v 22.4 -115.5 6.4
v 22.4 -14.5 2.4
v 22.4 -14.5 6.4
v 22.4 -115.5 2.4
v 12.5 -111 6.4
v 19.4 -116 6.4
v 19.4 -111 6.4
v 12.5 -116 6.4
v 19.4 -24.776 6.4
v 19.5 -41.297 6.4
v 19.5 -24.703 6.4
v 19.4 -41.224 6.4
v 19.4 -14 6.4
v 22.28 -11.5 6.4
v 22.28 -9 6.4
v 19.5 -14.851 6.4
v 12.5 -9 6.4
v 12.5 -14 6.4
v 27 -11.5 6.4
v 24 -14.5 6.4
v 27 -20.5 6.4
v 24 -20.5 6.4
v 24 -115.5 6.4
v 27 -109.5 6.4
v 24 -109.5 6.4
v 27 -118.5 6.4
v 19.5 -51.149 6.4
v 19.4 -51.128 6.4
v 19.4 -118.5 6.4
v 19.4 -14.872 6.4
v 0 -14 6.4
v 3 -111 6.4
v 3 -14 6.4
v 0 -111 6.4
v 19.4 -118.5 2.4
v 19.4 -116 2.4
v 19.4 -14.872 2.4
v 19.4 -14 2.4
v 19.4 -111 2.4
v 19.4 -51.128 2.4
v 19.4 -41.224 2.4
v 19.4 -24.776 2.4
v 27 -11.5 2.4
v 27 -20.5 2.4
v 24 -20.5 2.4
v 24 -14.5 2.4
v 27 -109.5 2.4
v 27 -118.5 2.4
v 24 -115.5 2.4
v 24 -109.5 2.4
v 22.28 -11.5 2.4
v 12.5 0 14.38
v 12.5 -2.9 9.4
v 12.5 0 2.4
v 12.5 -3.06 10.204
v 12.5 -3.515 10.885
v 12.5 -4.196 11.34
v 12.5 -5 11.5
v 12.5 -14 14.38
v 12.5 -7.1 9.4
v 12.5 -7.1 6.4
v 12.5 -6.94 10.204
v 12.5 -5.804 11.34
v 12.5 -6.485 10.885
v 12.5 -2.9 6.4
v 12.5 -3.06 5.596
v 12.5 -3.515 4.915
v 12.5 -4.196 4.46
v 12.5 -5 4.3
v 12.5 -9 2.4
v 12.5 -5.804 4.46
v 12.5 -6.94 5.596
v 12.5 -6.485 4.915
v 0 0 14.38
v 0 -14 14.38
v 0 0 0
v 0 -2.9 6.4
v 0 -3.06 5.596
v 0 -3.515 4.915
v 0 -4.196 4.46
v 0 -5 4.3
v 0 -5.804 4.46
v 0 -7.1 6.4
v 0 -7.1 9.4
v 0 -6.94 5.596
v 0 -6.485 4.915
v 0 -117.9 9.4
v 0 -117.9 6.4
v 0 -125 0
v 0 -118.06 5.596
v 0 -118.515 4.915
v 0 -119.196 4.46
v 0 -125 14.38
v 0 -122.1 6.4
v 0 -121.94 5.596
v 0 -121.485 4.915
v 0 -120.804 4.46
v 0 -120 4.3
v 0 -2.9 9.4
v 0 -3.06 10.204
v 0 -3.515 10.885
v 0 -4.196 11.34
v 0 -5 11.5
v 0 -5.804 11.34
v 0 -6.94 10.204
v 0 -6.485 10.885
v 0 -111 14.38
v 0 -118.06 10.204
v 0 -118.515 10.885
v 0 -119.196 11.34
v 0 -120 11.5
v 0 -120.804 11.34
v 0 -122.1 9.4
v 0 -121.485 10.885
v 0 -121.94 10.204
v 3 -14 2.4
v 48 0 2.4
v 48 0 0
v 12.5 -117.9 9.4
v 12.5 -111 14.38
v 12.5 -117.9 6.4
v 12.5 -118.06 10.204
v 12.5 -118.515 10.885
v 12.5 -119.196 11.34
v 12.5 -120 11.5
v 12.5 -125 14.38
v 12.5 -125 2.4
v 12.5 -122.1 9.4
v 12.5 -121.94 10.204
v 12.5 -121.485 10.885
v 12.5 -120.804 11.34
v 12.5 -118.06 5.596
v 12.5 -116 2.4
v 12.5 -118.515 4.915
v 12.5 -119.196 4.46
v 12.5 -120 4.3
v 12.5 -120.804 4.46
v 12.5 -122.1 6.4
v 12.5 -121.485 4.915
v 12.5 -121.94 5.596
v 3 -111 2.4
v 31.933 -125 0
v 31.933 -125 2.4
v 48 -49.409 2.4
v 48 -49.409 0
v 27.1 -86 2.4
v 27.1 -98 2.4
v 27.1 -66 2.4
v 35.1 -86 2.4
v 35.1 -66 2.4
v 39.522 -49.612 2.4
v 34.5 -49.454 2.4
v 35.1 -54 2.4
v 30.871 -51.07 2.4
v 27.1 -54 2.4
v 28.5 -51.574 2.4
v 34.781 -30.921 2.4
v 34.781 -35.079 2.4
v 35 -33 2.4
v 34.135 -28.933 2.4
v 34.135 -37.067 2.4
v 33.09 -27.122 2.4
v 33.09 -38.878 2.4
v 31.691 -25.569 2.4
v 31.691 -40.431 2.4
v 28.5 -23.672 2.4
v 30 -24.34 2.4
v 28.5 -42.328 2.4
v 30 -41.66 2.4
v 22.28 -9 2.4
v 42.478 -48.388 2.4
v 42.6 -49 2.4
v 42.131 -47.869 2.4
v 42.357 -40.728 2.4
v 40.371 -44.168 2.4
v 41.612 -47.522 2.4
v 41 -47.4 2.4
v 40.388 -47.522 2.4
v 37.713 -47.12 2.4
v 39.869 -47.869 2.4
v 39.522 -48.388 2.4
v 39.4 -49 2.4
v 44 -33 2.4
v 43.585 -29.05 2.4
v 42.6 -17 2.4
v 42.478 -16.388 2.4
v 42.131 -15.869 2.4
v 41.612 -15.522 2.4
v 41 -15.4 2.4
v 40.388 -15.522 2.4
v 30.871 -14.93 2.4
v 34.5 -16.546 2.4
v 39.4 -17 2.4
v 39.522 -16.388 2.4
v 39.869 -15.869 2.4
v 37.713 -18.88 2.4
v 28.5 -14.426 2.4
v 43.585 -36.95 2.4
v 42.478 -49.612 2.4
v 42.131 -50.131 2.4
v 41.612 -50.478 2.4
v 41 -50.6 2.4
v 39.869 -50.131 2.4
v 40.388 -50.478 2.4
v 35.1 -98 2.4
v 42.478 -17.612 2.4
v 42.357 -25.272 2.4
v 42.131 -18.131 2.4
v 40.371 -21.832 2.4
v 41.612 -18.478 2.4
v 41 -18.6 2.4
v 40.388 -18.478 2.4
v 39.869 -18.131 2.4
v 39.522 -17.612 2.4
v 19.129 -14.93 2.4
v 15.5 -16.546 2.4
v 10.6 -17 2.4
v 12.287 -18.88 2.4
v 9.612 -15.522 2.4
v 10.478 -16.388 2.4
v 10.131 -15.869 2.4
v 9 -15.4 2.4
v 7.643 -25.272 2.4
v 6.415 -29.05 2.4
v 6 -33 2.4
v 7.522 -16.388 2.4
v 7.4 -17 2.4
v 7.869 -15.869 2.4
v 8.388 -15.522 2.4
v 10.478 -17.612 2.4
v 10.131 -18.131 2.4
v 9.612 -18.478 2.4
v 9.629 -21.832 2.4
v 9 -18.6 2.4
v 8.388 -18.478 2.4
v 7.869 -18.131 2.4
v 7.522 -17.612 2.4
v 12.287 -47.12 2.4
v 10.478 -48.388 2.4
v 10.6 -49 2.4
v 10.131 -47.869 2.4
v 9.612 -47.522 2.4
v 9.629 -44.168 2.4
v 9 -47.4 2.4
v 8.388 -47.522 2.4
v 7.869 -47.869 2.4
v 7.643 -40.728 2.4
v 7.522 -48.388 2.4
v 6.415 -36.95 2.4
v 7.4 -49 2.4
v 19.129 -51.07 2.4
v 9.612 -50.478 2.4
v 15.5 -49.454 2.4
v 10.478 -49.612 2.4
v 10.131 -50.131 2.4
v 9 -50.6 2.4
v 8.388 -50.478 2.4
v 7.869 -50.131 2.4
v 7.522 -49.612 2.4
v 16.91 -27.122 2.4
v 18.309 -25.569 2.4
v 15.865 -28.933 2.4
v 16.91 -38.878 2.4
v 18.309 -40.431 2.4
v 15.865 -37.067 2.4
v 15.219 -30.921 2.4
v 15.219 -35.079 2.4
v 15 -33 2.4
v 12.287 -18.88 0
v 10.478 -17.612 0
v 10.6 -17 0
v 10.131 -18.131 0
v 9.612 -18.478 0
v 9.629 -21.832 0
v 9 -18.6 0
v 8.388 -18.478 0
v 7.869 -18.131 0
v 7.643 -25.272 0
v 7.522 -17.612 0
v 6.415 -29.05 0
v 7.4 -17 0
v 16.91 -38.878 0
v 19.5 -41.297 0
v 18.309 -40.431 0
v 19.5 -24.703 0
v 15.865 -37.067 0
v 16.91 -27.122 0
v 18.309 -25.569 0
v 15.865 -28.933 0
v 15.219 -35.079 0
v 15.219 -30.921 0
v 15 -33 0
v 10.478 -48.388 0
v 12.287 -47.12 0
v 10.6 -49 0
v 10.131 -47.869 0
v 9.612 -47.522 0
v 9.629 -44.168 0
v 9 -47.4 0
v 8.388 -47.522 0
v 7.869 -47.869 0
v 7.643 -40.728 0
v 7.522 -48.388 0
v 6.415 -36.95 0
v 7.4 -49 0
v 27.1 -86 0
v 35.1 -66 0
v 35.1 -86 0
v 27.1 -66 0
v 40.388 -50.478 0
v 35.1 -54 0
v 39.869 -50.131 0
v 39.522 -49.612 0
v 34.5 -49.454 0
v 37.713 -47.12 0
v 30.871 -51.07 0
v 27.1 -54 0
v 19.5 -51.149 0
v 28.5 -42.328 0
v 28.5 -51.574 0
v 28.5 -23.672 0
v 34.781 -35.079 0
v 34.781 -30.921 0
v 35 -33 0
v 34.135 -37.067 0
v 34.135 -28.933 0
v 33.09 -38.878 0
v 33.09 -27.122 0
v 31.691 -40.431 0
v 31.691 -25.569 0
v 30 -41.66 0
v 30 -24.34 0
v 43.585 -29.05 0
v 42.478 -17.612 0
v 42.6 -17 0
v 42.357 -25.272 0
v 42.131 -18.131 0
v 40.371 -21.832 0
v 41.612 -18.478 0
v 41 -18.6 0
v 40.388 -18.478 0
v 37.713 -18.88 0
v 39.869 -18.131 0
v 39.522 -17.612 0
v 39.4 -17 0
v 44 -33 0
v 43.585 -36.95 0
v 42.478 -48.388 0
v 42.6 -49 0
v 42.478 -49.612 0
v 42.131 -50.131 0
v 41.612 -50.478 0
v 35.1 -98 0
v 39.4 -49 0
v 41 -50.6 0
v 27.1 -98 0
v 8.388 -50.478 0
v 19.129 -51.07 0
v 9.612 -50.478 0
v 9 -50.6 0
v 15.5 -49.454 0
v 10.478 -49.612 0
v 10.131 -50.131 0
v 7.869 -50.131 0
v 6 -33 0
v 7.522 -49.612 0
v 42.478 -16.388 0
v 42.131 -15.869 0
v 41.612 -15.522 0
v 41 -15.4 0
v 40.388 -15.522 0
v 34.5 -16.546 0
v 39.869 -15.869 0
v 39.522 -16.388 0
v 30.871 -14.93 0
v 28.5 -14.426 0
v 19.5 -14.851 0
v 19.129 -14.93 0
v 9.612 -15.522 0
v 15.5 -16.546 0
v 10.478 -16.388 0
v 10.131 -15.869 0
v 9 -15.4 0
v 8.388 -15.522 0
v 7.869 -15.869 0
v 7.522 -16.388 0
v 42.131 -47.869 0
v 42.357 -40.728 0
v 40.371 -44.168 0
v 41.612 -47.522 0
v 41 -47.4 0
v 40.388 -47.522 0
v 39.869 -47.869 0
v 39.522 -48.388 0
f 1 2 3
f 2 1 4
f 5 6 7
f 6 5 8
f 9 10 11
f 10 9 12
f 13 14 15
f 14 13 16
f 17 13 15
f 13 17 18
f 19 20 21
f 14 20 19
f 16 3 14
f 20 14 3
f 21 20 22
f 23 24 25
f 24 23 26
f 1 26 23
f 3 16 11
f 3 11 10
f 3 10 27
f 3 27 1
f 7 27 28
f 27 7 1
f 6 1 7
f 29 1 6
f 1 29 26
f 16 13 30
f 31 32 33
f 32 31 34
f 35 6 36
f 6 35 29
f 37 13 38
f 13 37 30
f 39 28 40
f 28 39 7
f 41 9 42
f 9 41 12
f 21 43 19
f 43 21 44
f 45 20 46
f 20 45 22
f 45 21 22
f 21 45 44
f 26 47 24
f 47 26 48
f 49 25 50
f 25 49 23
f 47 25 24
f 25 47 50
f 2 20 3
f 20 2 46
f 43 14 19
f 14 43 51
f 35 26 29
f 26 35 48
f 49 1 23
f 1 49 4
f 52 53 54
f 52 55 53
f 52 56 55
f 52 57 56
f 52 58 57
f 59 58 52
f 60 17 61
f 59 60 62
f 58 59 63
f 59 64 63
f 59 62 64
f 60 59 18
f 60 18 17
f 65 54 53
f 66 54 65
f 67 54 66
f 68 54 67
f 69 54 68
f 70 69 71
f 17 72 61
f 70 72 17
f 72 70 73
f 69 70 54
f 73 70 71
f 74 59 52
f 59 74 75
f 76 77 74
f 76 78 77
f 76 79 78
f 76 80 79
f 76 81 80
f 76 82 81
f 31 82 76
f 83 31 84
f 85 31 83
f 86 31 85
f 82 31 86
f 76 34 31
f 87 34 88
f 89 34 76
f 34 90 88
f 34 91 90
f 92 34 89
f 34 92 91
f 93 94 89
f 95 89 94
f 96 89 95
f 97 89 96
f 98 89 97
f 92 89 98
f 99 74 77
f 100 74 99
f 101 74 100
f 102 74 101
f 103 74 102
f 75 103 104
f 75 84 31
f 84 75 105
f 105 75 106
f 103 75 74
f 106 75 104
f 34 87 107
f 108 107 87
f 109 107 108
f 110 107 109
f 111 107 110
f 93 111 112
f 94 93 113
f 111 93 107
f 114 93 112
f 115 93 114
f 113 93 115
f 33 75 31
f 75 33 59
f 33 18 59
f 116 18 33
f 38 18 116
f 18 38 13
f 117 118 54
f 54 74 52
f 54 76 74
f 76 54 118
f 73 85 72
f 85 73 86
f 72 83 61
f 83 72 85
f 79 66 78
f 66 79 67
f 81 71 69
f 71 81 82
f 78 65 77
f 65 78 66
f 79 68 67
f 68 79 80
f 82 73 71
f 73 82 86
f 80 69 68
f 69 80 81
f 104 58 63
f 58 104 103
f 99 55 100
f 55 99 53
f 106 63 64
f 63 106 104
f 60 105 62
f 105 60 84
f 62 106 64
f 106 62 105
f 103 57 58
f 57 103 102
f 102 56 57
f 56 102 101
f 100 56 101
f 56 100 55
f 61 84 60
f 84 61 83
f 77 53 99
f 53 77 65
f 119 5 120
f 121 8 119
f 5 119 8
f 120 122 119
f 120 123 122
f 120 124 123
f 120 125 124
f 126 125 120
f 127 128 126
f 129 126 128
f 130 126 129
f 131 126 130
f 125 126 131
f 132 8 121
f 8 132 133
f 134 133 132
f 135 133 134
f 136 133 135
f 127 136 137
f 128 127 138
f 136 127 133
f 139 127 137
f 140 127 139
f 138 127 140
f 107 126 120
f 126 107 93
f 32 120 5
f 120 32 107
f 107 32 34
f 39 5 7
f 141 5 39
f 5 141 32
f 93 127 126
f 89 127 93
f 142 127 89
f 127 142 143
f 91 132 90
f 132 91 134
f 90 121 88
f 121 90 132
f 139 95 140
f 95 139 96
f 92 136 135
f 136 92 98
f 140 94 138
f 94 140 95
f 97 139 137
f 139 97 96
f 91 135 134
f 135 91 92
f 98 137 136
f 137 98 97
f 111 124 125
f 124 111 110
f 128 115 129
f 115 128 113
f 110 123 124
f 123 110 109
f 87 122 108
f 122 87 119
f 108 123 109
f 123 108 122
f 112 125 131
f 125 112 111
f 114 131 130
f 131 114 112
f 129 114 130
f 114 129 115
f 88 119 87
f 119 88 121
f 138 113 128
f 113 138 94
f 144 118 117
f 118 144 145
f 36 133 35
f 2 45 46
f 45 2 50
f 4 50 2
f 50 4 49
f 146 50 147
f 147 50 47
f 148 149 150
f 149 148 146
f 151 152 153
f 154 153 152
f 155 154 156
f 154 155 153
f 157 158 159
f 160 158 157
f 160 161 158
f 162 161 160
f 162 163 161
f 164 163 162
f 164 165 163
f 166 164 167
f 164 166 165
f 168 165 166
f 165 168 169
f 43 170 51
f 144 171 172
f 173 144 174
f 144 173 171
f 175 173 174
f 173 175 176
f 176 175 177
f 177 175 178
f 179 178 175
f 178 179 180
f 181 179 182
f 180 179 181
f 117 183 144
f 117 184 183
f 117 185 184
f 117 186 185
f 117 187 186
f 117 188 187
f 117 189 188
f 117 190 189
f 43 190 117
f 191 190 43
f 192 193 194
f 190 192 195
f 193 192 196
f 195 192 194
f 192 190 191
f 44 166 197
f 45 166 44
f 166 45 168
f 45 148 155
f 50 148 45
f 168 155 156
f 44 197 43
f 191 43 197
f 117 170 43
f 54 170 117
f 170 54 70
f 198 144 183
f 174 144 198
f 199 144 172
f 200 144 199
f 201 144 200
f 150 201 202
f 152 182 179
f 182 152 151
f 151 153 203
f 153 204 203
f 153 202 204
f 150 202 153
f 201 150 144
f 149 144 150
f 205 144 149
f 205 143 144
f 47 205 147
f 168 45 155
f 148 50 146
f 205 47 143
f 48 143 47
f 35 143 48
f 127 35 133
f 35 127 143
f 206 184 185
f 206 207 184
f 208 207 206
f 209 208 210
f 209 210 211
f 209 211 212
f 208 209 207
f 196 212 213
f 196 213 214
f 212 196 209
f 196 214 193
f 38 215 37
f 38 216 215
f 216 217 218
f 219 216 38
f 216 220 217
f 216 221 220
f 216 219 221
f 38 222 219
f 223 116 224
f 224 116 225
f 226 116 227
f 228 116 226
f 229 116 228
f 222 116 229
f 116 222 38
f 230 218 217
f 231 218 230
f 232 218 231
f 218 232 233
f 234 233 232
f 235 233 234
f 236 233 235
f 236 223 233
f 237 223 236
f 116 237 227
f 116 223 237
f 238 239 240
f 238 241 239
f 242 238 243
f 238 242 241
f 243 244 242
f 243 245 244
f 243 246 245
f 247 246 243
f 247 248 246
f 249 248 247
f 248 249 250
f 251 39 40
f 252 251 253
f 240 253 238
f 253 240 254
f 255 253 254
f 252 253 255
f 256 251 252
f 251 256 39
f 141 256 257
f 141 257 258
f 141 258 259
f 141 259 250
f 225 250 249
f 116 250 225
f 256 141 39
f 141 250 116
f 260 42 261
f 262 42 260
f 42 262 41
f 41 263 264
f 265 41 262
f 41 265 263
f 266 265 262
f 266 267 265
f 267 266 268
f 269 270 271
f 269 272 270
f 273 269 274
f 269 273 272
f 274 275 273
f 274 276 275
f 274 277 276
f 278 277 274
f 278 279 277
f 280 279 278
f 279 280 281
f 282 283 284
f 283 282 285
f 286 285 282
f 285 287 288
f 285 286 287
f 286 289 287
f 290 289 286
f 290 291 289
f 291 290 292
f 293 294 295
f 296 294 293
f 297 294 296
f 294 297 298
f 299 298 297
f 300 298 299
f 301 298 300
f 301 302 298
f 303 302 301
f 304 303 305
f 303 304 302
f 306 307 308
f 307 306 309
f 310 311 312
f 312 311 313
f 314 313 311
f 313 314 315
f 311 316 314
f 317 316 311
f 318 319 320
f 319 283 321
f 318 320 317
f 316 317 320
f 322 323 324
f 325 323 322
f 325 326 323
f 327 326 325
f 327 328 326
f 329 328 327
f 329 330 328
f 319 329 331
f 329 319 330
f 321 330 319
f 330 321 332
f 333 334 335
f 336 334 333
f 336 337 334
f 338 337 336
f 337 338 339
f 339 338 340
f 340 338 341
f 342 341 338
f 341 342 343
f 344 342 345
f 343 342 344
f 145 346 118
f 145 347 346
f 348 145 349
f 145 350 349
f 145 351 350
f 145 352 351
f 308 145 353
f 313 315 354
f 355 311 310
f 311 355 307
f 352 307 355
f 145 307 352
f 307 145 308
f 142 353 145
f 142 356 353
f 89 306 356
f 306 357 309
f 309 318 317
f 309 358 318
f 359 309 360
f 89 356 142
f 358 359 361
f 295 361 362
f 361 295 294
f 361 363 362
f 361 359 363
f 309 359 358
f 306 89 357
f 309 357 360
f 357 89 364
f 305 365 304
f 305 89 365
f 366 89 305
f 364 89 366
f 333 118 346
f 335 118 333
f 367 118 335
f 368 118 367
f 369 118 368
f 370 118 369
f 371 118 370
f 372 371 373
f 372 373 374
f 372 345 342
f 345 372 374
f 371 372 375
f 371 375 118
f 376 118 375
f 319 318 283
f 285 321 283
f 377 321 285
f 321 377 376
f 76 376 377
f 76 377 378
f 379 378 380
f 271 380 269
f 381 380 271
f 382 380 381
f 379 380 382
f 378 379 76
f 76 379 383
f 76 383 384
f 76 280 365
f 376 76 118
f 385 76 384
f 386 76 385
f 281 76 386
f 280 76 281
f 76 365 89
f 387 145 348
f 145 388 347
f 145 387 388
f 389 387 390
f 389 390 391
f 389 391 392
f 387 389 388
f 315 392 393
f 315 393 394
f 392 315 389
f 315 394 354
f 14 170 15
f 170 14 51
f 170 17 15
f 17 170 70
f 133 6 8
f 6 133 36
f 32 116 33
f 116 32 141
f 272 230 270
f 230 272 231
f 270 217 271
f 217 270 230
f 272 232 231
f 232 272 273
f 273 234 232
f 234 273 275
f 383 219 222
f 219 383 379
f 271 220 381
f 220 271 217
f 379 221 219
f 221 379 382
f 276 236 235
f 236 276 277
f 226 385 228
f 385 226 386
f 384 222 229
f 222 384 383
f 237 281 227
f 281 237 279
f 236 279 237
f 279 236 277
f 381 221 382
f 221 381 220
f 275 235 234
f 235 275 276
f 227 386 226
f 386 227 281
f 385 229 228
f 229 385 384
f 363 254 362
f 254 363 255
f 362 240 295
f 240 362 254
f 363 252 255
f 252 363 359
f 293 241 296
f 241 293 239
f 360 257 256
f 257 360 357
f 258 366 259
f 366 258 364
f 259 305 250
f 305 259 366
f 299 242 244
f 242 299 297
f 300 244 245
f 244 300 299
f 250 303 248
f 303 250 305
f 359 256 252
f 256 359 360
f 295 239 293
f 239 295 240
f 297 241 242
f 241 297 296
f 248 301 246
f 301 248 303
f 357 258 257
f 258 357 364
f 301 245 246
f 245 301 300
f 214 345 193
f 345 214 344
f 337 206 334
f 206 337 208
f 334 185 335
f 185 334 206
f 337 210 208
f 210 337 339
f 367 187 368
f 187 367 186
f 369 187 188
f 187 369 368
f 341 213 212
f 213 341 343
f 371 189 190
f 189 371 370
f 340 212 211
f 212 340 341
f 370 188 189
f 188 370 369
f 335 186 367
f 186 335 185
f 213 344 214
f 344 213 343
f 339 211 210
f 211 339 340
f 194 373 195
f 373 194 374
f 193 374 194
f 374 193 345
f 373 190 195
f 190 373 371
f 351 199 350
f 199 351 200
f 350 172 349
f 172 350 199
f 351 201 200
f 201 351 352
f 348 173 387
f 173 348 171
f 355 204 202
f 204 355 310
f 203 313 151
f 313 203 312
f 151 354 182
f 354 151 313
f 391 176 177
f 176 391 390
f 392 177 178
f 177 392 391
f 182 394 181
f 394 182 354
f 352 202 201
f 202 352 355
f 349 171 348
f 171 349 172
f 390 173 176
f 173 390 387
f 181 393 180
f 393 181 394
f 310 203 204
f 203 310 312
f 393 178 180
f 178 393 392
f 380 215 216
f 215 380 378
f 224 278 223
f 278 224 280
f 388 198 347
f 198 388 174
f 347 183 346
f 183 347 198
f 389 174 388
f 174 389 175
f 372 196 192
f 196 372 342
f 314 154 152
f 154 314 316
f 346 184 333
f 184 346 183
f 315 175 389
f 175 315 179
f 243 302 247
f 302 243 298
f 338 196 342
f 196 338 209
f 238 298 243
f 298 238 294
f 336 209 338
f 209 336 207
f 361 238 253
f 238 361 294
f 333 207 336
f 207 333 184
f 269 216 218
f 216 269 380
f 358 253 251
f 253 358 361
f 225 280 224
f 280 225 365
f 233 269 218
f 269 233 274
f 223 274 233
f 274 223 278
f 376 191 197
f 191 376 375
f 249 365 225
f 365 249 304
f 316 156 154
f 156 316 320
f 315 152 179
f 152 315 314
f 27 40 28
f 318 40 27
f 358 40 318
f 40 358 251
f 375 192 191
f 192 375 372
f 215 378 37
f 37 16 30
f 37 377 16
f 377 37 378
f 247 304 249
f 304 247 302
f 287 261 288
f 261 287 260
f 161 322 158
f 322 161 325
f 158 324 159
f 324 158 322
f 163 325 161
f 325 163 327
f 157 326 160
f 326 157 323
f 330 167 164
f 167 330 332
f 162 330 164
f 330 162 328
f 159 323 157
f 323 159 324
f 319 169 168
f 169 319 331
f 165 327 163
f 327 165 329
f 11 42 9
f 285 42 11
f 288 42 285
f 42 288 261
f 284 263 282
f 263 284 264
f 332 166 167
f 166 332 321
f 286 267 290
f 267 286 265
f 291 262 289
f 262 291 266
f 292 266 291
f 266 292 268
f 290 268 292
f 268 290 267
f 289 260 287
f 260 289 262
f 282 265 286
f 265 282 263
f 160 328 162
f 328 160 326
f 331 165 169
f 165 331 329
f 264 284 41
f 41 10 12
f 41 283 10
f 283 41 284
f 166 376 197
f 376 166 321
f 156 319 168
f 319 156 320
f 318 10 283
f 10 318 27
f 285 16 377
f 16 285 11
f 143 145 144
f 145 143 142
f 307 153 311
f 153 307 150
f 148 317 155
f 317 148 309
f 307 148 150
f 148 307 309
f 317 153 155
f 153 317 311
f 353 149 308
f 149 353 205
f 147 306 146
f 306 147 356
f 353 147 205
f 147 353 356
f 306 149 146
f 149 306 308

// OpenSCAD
// Fan and Duet read board holder for 2020 Kossel

thickness=2.4;
leftMargin=10;
rightMargin=15;
ribThickness=3;
ribHeight=4;
footHeight = 12.5;	// plus 5mm nylock nut + 2.5mm alu sheet = 20mm
footWidth=14;
pcbThick=1.6;
pcbClear=0.1;
pcbWidth=100;
pcbWclear=0.5;
pcbOffset=24;
m3ClearRad=1.6;
m4ClearRad=2.1;
overlap=0.02;

module duetRibs() {
	translate([-pcbThick-ribThickness,-overlap-pcbWclear,thickness-overlap])
		cube([ribThickness,pcbWidth+2*pcbWclear+2*overlap,ribHeight+overlap]);

	translate([0,-overlap-pcbWclear,thickness-overlap])
		cube([ribThickness,6+overlap,ribHeight+overlap]);
	translate([0,pcbWidth+pcbWclear-6,thickness-overlap])
		cube([ribThickness,6+overlap,ribHeight+overlap]);

	translate([-ribThickness-pcbThick,-ribThickness-pcbWclear,thickness-overlap])
		cube([pcbThick+2*ribThickness,ribThickness,ribHeight+overlap]);
	translate([-ribThickness-pcbThick,pcbWidth+pcbWclear,thickness-overlap])
		cube([pcbThick+2*ribThickness,ribThickness,ribHeight+overlap]);
}

module foot() {
	difference() {
		translate([0,0,thickness-overlap]) cube([footHeight,footWidth,12]);
		translate([-overlap,5,thickness+4])
			rotate([0,90,0])
				cylinder(r=m4ClearRad,h=footHeight+2*overlap,$fn=16);
		translate([-overlap,5,thickness+7])
			rotate([0,90,0])
				cylinder(r=m4ClearRad,h=footHeight+2*overlap,$fn=16);
		translate([0,5,thickness+5.5])
			cube([2*(footHeight+overlap),2*m4ClearRad,3],center=true);
	}
}

module supportRib() {
	cube([pcbOffset-pcbThick-pcbClear-overlap,5,ribHeight+overlap]);
}

module fanCutouts() {
	translate([0,0,-overlap])
		difference() {
			union() {
				cylinder(r=19,h=10);
				for(x=[-16,16])
					for(y=[-16,16])
						translate([x,y,-overlap]) cylinder(r=m3ClearRad,h=20,$fn=16);
			}
			translate([0,0,-overlap]) cylinder(r=10,h=10);
			translate([-1,0,-overlap]) cube([9,100,20], center=true);
		}
}

module terminalCutout() {
	cube([8,12,20],center=true);
}

mirror([0,1,0])
difference() {
	union() {
		cube([48,pcbWidth+leftMargin+rightMargin,thickness]);
		translate([pcbOffset,rightMargin,0]) duetRibs();
		foot();
		translate([0,pcbWidth+leftMargin+rightMargin-10+10,0]) mirror([0,1,0]) foot();
		translate([0,10-1,thickness-overlap]) supportRib();
		translate([0,pcbWidth+leftMargin+rightMargin-10-5+1,thickness-overlap])
			supportRib();	
		translate([0,10-overlap,thickness-overlap])
			cube([ribThickness,pcbWidth+leftMargin+rightMargin-20+2*overlap,ribHeight+overlap]);
	}
	translate([25,rightMargin+18,0]) fanCutouts();
	translate([50,40,-overlap]) rotate([0,0,12]) cube([200,200,10]);
	translate([pcbOffset+pcbClear+7,rightMargin+45,0]) terminalCutout();
	translate([pcbOffset+pcbClear+7,rightMargin+77,0]) terminalCutout();
}
